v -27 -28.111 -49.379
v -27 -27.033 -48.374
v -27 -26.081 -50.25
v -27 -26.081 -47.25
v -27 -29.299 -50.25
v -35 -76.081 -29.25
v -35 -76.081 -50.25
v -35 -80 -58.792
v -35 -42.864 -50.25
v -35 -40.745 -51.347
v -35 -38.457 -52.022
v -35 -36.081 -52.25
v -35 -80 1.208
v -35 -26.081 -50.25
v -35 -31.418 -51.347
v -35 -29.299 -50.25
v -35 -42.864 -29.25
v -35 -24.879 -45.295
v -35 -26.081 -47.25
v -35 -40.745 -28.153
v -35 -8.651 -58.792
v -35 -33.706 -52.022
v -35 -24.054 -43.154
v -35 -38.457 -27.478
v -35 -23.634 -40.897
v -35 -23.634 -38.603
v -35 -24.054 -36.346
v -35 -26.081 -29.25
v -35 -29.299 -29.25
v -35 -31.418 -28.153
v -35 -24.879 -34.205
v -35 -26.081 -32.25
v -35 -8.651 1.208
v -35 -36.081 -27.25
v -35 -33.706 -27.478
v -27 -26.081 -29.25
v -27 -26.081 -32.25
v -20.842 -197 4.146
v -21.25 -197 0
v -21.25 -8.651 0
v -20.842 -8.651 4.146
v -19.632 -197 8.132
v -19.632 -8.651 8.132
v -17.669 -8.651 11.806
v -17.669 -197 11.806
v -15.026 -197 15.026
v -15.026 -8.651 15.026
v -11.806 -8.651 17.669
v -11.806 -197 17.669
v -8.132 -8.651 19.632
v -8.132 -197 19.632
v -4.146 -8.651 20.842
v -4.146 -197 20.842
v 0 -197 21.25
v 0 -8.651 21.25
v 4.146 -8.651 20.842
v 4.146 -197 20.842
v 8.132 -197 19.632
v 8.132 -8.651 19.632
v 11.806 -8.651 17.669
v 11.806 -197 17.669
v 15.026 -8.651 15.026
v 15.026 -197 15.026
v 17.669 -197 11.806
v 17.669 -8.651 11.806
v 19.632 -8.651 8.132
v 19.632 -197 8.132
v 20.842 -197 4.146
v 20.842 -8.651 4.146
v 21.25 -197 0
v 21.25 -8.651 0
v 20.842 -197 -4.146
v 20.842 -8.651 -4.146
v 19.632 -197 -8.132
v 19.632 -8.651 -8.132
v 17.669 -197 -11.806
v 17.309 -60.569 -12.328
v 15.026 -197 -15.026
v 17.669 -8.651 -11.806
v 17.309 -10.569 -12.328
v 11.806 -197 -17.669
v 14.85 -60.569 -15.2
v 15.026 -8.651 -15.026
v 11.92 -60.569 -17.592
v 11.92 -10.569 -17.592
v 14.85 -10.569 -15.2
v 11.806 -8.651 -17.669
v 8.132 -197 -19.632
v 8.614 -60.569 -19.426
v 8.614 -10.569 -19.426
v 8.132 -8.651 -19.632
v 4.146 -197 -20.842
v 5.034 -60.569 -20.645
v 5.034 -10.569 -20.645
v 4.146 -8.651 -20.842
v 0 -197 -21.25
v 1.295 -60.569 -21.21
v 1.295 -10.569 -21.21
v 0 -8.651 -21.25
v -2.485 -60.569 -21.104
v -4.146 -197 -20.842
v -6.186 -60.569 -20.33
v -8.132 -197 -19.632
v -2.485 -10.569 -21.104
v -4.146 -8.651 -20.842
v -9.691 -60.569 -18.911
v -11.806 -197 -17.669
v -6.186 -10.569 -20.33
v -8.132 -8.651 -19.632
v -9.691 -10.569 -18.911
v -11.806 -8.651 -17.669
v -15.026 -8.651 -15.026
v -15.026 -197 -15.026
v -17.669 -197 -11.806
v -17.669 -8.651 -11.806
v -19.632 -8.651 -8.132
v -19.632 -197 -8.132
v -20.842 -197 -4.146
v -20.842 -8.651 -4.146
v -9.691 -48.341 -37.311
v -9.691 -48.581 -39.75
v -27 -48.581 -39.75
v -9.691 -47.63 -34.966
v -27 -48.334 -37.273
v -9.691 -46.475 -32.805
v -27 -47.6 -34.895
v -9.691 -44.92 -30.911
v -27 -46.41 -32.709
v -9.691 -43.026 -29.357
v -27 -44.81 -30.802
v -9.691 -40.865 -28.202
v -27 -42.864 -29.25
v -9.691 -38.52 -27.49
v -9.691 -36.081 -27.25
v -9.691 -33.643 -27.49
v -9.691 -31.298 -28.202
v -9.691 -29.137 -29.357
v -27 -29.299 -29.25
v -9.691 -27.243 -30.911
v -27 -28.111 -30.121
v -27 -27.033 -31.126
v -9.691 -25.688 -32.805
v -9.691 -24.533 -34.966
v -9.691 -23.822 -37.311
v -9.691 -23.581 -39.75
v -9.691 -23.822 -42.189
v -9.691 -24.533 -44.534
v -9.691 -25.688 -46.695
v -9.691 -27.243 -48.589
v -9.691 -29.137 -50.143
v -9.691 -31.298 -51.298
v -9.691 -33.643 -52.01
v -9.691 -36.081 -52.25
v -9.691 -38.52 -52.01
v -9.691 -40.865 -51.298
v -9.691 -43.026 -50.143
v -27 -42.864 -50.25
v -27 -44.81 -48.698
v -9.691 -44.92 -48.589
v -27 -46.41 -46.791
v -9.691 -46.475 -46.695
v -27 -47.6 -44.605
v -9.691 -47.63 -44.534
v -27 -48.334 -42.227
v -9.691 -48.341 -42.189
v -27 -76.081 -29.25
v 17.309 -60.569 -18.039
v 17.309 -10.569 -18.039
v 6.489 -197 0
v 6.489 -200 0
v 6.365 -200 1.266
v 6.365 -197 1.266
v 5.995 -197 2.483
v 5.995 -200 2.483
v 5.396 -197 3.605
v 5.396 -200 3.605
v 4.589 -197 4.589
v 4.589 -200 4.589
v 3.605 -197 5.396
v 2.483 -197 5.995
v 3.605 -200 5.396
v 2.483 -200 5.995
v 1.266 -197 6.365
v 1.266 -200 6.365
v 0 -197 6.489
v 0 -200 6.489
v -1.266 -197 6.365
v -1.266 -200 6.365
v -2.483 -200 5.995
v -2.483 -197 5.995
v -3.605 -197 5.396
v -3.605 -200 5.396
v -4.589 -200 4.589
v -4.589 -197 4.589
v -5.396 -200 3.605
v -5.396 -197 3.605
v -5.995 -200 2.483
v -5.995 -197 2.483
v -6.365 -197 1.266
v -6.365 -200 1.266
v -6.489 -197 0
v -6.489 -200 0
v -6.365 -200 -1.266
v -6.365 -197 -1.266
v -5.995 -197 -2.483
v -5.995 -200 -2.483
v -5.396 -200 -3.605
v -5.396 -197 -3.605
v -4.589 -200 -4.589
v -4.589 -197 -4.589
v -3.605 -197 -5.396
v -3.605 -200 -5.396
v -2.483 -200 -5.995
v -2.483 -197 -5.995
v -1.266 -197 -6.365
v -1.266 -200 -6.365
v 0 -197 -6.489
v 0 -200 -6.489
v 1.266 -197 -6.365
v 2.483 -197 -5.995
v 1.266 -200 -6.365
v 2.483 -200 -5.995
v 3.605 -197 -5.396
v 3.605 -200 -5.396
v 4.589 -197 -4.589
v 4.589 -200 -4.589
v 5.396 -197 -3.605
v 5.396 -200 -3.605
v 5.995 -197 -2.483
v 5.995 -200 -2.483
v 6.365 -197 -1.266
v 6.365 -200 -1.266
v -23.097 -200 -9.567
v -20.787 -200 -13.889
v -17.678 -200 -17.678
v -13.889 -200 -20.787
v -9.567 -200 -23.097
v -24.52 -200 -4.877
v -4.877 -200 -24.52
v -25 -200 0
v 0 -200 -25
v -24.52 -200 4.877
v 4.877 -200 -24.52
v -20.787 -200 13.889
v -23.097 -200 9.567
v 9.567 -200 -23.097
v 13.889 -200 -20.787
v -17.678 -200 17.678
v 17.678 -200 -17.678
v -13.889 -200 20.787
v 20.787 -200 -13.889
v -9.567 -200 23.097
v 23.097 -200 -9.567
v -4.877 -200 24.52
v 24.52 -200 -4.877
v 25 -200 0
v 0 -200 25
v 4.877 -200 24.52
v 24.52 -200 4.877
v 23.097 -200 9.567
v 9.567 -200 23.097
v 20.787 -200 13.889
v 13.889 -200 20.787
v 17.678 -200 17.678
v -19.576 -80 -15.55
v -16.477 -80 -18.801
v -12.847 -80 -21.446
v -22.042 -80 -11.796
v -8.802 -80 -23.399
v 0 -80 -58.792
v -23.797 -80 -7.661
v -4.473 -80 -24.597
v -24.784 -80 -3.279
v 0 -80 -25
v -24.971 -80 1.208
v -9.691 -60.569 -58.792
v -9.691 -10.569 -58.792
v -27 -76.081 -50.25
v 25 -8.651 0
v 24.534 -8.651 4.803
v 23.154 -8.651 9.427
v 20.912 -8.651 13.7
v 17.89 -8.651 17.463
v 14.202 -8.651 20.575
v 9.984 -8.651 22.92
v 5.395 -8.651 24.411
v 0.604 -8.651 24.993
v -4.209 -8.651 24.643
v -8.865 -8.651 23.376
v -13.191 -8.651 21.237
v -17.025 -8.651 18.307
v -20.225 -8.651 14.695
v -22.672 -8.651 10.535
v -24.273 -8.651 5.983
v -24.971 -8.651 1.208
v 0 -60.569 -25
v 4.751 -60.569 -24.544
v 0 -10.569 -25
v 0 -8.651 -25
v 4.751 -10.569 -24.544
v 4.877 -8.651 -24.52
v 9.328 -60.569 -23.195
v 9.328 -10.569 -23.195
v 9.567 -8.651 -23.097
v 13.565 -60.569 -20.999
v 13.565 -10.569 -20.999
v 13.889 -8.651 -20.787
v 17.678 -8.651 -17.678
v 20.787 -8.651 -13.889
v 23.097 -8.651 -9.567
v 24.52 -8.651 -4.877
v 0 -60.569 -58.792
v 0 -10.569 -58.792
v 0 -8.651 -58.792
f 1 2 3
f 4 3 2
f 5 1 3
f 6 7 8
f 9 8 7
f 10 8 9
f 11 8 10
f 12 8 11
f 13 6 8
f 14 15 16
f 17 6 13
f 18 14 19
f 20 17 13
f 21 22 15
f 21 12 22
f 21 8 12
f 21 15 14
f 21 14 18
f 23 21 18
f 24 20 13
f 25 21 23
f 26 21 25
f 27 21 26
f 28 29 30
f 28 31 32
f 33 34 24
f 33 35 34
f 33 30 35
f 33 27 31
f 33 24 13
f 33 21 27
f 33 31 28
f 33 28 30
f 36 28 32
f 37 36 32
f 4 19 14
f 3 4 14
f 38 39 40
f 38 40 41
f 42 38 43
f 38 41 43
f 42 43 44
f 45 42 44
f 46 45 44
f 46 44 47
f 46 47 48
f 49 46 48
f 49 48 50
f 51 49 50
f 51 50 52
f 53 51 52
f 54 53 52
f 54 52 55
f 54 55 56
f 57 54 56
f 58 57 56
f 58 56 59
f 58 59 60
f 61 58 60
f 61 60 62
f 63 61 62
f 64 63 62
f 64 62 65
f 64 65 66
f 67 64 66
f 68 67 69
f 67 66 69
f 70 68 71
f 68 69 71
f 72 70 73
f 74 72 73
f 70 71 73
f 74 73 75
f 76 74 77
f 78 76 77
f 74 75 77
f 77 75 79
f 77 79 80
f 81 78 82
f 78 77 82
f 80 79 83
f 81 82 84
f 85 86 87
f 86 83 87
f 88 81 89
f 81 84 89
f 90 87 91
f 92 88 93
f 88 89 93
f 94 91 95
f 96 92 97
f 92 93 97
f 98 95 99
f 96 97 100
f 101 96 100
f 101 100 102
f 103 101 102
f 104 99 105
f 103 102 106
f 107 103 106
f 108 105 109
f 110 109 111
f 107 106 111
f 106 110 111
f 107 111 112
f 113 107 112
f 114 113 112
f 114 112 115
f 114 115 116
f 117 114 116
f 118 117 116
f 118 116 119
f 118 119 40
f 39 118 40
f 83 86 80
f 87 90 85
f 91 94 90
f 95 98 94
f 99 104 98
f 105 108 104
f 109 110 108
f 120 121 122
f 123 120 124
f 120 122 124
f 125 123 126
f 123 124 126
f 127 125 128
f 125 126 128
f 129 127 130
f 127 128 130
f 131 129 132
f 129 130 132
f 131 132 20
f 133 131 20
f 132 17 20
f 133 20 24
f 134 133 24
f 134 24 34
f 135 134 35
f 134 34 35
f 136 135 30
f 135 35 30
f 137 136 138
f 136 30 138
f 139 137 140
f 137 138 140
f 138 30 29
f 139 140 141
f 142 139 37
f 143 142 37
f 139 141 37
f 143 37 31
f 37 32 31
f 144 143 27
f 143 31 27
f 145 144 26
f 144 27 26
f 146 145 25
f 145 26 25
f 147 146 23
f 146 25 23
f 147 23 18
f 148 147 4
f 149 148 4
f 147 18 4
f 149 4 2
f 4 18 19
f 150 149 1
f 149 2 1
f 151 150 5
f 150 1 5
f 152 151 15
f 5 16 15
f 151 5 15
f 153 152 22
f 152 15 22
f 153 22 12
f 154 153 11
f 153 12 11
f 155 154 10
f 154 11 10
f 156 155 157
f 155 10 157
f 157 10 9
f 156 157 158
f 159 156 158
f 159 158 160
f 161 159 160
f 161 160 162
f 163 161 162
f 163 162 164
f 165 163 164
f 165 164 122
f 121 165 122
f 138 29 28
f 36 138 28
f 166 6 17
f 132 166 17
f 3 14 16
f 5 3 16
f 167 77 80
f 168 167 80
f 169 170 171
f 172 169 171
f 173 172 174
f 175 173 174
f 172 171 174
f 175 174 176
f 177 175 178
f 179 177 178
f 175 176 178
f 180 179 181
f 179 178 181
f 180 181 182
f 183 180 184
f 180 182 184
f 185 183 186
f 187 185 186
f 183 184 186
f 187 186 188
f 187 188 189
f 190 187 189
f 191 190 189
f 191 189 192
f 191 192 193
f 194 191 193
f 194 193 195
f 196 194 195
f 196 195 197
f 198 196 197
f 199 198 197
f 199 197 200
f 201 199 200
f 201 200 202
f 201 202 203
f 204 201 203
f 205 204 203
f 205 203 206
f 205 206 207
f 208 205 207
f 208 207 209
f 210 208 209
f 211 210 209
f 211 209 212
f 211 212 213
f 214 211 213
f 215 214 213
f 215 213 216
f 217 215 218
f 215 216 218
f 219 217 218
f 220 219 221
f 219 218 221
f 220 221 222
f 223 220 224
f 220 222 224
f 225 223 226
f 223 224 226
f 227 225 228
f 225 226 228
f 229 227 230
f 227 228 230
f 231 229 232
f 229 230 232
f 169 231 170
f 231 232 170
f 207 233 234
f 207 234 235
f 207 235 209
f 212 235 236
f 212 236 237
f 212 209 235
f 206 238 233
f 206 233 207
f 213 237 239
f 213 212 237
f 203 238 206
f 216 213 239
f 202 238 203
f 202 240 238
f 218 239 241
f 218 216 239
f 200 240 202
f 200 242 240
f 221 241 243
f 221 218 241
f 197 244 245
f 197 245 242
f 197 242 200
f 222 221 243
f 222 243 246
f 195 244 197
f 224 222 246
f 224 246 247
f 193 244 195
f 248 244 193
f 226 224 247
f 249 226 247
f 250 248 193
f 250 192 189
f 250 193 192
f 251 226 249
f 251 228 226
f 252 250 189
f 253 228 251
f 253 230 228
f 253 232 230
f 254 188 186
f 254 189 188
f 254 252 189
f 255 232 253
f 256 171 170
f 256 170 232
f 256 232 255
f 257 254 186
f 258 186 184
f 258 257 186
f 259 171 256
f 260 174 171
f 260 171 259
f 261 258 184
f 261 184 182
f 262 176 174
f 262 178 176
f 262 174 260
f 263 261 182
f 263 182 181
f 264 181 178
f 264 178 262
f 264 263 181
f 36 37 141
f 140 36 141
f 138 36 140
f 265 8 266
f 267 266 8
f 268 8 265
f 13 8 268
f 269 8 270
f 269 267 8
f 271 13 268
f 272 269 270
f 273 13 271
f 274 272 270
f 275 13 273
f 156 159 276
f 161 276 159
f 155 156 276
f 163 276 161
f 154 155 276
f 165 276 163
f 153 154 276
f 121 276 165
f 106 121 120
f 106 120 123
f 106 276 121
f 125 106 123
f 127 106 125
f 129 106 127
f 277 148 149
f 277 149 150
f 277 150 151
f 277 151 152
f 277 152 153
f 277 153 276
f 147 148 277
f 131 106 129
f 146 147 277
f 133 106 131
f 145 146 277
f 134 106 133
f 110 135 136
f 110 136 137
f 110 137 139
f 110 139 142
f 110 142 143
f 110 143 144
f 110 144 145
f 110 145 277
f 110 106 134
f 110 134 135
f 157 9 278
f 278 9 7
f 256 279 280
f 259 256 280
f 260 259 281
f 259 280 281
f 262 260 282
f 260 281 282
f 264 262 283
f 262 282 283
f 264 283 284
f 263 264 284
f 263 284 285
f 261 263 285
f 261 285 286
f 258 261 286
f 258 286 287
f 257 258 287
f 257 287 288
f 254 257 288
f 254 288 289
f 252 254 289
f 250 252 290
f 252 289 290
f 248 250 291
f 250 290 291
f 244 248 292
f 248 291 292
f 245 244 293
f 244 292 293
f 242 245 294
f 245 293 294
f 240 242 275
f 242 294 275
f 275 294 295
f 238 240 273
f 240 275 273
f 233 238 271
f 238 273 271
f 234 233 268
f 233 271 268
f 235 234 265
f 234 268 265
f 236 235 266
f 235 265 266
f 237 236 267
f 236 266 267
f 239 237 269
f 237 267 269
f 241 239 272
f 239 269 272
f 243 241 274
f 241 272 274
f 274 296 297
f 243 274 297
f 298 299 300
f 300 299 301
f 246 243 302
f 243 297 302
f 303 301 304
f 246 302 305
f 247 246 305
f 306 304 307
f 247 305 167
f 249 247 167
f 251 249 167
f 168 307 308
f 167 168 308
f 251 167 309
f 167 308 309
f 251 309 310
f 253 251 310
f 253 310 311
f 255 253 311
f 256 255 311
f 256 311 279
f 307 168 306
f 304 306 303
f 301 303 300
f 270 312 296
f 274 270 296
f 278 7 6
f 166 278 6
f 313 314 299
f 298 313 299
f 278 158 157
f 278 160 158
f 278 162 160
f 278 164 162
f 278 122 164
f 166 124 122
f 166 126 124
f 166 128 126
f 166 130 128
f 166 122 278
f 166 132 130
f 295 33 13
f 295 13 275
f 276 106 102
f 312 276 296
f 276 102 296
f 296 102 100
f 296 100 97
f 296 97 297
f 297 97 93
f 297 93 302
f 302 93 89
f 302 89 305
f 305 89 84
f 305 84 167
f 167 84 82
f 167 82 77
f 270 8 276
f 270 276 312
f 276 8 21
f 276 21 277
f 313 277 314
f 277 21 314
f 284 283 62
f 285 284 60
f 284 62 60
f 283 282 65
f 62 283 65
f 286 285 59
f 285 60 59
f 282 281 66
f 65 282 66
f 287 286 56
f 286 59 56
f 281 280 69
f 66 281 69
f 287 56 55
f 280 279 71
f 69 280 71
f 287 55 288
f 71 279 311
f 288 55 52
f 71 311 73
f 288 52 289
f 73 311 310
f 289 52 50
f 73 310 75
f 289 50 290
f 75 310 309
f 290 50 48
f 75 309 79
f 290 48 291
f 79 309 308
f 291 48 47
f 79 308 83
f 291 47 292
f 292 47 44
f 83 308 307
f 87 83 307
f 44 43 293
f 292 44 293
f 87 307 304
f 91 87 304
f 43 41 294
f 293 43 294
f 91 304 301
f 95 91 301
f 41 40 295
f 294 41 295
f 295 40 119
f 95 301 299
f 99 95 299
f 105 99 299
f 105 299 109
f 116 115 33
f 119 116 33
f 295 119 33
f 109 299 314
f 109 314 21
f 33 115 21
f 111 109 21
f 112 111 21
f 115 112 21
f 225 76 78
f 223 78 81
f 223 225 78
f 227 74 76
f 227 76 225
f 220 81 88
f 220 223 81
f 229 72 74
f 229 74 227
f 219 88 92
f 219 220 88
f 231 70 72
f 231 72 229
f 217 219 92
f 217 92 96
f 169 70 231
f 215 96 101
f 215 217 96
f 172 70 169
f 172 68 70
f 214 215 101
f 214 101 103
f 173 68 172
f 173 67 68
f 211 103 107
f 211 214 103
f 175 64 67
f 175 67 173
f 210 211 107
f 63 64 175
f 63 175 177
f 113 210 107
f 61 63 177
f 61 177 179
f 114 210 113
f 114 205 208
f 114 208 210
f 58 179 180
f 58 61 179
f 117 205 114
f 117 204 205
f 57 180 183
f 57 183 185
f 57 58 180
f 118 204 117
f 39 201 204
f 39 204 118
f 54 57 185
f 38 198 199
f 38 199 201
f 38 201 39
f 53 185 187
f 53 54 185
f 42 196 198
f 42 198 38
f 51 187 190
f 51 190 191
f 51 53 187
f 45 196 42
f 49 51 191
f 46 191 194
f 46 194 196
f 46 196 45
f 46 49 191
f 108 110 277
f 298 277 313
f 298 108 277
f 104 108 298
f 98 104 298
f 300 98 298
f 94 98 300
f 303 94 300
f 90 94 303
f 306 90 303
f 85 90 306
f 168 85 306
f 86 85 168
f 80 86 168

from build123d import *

# Parameters (mm, degrees)
F0_R      = 25
F1_DEPTH  = 200
F4_W      = 35
F4_H      = 60
F5_DEPTH  = 80
F2_R      = 21.25
F6_DEPTH  = 197
F3_W      = 27
F3_H      = 50
F8_DEPTH  = 60
F9_DEPTH  = 8
F10_W     = 47.1464432776
F10_H     = 8.6505031213
F10_W_2   = 35
F12_DEPTH = 83.7927124713
F14_DEPTH = 50
F15_R     = 6.4891960767
F16_DEPTH = 25


with BuildPart() as f1:
    # F0 (on Front) → F1 (new body)
    with BuildSketch(Plane.XZ):
        Circle(F0_R)
    extrude(amount=F1_DEPTH)

    # F4 (on Front) → F5 (join)
    with BuildSketch(Plane.XZ):
        with Locations((-17.5, -28.7917124713)):
            Rectangle(F4_W, F4_H)
    extrude(amount=F5_DEPTH)

    # F2 (on face) → F6 (cut)
    with BuildSketch(Plane(origin=(0, 0, 0), x_dir=(-1, 0, 0), z_dir=(0, 1, 0))):
        Circle(F2_R)
    extrude(amount=-F6_DEPTH, mode=Mode.SUBTRACT)

    # F3 (on Top) → F8 (cut)
    with BuildSketch(Plane.XY):
        with Locations((3.8086780198, -35.5690324024)):
            Rectangle(F3_W, F3_H)
    extrude(amount=-F8_DEPTH, mode=Mode.SUBTRACT)

    # F7 (on face) → F9 (cut)
    with BuildSketch(Plane(origin=(-35, 0, 0), x_dir=(0, -1, 0), z_dir=(-1, 0, 0))):
        with BuildLine():
            ThreePointArc((41.3552170133, -29.25), (46.082189469, -33.5816991961), (47.8314612359, -39.75))
            ThreePointArc((47.8314612359, -39.75), (46.082189469, -45.9183008039), (41.3552170133, -50.25))
            Line((41.3552170133, -50.25), (76.0814612359, -50.25))
            Line((76.0814612359, -50.25), (76.0814612359, -29.25))
            Line((76.0814612359, -29.25), (41.3552170133, -29.25))
        make_face()
        with BuildLine():
            Line((26.0814612359, -50.25), (30.8077054584, -50.25))
            ThreePointArc((30.8077054584, -50.25), (28.1435615229, -48.4132700608), (26.0814612359, -45.9194813396))
            Line((26.0814612359, -45.9194813396), (26.0814612359, -50.25))
        make_face()
        with BuildLine():
            Line((36.0814612359, -29.25), (30.8077054584, -29.25))
            ThreePointArc((30.8077054584, -29.25), (28.1435615229, -31.0867299392), (26.0814612359, -33.5805186604))
            Line((26.0814612359, -33.5805186604), (26.0814612359, -45.9194813396))
            ThreePointArc((26.0814612359, -45.9194813396), (28.1435615229, -48.4132700608), (30.8077054584, -50.25))
            Line((30.8077054584, -50.25), (36.0814612359, -50.25))
            Line((36.0814612359, -50.25), (36.0814612359, -29.25))
        make_face()
        with BuildLine():
            ThreePointArc((26.0814612359, -33.5805186604), (28.1435615229, -31.0867299392), (30.8077054584, -29.25))
            Line((30.8077054584, -29.25), (26.0814612359, -29.25))
            Line((26.0814612359, -29.25), (26.0814612359, -33.5805186604))
        make_face()
    extrude(amount=-F9_DEPTH, mode=Mode.SUBTRACT)

    # F10 (on face) → F12 (cut, through all)
    with BuildSketch(Plane(origin=(0, 0, -58.7917124713), x_dir=(1, 0, 0), z_dir=(0, 0, -1))):
        with Locations((23.5732216388, 4.3252515607)):
            Rectangle(F10_W, F10_H)
        with Locations((-17.5, 4.3252515607)):
            Rectangle(F10_W_2, F10_H)
    extrude(amount=-F12_DEPTH, mode=Mode.SUBTRACT)

    # F13 (on face) → F14 (cut)
    with BuildSketch(Plane(origin=(-35, 0, 0), x_dir=(0, -1, 0), z_dir=(-1, 0, 0))):
        with BuildLine():
            ThreePointArc((23.5814612359, -39.75), (36.0814612359, -52.25), (48.5814612359, -39.75))
            ThreePointArc((48.5814612359, -39.75), (36.0814612359, -27.25), (23.5814612359, -39.75))
        make_face()
    extrude(amount=-F14_DEPTH, mode=Mode.SUBTRACT)

    # F15 (on face) → F16 (cut)
    with BuildSketch(Plane.XZ.offset(200)):
        Circle(F15_R)
    extrude(amount=-F16_DEPTH, mode=Mode.SUBTRACT)


solid = f1.part
